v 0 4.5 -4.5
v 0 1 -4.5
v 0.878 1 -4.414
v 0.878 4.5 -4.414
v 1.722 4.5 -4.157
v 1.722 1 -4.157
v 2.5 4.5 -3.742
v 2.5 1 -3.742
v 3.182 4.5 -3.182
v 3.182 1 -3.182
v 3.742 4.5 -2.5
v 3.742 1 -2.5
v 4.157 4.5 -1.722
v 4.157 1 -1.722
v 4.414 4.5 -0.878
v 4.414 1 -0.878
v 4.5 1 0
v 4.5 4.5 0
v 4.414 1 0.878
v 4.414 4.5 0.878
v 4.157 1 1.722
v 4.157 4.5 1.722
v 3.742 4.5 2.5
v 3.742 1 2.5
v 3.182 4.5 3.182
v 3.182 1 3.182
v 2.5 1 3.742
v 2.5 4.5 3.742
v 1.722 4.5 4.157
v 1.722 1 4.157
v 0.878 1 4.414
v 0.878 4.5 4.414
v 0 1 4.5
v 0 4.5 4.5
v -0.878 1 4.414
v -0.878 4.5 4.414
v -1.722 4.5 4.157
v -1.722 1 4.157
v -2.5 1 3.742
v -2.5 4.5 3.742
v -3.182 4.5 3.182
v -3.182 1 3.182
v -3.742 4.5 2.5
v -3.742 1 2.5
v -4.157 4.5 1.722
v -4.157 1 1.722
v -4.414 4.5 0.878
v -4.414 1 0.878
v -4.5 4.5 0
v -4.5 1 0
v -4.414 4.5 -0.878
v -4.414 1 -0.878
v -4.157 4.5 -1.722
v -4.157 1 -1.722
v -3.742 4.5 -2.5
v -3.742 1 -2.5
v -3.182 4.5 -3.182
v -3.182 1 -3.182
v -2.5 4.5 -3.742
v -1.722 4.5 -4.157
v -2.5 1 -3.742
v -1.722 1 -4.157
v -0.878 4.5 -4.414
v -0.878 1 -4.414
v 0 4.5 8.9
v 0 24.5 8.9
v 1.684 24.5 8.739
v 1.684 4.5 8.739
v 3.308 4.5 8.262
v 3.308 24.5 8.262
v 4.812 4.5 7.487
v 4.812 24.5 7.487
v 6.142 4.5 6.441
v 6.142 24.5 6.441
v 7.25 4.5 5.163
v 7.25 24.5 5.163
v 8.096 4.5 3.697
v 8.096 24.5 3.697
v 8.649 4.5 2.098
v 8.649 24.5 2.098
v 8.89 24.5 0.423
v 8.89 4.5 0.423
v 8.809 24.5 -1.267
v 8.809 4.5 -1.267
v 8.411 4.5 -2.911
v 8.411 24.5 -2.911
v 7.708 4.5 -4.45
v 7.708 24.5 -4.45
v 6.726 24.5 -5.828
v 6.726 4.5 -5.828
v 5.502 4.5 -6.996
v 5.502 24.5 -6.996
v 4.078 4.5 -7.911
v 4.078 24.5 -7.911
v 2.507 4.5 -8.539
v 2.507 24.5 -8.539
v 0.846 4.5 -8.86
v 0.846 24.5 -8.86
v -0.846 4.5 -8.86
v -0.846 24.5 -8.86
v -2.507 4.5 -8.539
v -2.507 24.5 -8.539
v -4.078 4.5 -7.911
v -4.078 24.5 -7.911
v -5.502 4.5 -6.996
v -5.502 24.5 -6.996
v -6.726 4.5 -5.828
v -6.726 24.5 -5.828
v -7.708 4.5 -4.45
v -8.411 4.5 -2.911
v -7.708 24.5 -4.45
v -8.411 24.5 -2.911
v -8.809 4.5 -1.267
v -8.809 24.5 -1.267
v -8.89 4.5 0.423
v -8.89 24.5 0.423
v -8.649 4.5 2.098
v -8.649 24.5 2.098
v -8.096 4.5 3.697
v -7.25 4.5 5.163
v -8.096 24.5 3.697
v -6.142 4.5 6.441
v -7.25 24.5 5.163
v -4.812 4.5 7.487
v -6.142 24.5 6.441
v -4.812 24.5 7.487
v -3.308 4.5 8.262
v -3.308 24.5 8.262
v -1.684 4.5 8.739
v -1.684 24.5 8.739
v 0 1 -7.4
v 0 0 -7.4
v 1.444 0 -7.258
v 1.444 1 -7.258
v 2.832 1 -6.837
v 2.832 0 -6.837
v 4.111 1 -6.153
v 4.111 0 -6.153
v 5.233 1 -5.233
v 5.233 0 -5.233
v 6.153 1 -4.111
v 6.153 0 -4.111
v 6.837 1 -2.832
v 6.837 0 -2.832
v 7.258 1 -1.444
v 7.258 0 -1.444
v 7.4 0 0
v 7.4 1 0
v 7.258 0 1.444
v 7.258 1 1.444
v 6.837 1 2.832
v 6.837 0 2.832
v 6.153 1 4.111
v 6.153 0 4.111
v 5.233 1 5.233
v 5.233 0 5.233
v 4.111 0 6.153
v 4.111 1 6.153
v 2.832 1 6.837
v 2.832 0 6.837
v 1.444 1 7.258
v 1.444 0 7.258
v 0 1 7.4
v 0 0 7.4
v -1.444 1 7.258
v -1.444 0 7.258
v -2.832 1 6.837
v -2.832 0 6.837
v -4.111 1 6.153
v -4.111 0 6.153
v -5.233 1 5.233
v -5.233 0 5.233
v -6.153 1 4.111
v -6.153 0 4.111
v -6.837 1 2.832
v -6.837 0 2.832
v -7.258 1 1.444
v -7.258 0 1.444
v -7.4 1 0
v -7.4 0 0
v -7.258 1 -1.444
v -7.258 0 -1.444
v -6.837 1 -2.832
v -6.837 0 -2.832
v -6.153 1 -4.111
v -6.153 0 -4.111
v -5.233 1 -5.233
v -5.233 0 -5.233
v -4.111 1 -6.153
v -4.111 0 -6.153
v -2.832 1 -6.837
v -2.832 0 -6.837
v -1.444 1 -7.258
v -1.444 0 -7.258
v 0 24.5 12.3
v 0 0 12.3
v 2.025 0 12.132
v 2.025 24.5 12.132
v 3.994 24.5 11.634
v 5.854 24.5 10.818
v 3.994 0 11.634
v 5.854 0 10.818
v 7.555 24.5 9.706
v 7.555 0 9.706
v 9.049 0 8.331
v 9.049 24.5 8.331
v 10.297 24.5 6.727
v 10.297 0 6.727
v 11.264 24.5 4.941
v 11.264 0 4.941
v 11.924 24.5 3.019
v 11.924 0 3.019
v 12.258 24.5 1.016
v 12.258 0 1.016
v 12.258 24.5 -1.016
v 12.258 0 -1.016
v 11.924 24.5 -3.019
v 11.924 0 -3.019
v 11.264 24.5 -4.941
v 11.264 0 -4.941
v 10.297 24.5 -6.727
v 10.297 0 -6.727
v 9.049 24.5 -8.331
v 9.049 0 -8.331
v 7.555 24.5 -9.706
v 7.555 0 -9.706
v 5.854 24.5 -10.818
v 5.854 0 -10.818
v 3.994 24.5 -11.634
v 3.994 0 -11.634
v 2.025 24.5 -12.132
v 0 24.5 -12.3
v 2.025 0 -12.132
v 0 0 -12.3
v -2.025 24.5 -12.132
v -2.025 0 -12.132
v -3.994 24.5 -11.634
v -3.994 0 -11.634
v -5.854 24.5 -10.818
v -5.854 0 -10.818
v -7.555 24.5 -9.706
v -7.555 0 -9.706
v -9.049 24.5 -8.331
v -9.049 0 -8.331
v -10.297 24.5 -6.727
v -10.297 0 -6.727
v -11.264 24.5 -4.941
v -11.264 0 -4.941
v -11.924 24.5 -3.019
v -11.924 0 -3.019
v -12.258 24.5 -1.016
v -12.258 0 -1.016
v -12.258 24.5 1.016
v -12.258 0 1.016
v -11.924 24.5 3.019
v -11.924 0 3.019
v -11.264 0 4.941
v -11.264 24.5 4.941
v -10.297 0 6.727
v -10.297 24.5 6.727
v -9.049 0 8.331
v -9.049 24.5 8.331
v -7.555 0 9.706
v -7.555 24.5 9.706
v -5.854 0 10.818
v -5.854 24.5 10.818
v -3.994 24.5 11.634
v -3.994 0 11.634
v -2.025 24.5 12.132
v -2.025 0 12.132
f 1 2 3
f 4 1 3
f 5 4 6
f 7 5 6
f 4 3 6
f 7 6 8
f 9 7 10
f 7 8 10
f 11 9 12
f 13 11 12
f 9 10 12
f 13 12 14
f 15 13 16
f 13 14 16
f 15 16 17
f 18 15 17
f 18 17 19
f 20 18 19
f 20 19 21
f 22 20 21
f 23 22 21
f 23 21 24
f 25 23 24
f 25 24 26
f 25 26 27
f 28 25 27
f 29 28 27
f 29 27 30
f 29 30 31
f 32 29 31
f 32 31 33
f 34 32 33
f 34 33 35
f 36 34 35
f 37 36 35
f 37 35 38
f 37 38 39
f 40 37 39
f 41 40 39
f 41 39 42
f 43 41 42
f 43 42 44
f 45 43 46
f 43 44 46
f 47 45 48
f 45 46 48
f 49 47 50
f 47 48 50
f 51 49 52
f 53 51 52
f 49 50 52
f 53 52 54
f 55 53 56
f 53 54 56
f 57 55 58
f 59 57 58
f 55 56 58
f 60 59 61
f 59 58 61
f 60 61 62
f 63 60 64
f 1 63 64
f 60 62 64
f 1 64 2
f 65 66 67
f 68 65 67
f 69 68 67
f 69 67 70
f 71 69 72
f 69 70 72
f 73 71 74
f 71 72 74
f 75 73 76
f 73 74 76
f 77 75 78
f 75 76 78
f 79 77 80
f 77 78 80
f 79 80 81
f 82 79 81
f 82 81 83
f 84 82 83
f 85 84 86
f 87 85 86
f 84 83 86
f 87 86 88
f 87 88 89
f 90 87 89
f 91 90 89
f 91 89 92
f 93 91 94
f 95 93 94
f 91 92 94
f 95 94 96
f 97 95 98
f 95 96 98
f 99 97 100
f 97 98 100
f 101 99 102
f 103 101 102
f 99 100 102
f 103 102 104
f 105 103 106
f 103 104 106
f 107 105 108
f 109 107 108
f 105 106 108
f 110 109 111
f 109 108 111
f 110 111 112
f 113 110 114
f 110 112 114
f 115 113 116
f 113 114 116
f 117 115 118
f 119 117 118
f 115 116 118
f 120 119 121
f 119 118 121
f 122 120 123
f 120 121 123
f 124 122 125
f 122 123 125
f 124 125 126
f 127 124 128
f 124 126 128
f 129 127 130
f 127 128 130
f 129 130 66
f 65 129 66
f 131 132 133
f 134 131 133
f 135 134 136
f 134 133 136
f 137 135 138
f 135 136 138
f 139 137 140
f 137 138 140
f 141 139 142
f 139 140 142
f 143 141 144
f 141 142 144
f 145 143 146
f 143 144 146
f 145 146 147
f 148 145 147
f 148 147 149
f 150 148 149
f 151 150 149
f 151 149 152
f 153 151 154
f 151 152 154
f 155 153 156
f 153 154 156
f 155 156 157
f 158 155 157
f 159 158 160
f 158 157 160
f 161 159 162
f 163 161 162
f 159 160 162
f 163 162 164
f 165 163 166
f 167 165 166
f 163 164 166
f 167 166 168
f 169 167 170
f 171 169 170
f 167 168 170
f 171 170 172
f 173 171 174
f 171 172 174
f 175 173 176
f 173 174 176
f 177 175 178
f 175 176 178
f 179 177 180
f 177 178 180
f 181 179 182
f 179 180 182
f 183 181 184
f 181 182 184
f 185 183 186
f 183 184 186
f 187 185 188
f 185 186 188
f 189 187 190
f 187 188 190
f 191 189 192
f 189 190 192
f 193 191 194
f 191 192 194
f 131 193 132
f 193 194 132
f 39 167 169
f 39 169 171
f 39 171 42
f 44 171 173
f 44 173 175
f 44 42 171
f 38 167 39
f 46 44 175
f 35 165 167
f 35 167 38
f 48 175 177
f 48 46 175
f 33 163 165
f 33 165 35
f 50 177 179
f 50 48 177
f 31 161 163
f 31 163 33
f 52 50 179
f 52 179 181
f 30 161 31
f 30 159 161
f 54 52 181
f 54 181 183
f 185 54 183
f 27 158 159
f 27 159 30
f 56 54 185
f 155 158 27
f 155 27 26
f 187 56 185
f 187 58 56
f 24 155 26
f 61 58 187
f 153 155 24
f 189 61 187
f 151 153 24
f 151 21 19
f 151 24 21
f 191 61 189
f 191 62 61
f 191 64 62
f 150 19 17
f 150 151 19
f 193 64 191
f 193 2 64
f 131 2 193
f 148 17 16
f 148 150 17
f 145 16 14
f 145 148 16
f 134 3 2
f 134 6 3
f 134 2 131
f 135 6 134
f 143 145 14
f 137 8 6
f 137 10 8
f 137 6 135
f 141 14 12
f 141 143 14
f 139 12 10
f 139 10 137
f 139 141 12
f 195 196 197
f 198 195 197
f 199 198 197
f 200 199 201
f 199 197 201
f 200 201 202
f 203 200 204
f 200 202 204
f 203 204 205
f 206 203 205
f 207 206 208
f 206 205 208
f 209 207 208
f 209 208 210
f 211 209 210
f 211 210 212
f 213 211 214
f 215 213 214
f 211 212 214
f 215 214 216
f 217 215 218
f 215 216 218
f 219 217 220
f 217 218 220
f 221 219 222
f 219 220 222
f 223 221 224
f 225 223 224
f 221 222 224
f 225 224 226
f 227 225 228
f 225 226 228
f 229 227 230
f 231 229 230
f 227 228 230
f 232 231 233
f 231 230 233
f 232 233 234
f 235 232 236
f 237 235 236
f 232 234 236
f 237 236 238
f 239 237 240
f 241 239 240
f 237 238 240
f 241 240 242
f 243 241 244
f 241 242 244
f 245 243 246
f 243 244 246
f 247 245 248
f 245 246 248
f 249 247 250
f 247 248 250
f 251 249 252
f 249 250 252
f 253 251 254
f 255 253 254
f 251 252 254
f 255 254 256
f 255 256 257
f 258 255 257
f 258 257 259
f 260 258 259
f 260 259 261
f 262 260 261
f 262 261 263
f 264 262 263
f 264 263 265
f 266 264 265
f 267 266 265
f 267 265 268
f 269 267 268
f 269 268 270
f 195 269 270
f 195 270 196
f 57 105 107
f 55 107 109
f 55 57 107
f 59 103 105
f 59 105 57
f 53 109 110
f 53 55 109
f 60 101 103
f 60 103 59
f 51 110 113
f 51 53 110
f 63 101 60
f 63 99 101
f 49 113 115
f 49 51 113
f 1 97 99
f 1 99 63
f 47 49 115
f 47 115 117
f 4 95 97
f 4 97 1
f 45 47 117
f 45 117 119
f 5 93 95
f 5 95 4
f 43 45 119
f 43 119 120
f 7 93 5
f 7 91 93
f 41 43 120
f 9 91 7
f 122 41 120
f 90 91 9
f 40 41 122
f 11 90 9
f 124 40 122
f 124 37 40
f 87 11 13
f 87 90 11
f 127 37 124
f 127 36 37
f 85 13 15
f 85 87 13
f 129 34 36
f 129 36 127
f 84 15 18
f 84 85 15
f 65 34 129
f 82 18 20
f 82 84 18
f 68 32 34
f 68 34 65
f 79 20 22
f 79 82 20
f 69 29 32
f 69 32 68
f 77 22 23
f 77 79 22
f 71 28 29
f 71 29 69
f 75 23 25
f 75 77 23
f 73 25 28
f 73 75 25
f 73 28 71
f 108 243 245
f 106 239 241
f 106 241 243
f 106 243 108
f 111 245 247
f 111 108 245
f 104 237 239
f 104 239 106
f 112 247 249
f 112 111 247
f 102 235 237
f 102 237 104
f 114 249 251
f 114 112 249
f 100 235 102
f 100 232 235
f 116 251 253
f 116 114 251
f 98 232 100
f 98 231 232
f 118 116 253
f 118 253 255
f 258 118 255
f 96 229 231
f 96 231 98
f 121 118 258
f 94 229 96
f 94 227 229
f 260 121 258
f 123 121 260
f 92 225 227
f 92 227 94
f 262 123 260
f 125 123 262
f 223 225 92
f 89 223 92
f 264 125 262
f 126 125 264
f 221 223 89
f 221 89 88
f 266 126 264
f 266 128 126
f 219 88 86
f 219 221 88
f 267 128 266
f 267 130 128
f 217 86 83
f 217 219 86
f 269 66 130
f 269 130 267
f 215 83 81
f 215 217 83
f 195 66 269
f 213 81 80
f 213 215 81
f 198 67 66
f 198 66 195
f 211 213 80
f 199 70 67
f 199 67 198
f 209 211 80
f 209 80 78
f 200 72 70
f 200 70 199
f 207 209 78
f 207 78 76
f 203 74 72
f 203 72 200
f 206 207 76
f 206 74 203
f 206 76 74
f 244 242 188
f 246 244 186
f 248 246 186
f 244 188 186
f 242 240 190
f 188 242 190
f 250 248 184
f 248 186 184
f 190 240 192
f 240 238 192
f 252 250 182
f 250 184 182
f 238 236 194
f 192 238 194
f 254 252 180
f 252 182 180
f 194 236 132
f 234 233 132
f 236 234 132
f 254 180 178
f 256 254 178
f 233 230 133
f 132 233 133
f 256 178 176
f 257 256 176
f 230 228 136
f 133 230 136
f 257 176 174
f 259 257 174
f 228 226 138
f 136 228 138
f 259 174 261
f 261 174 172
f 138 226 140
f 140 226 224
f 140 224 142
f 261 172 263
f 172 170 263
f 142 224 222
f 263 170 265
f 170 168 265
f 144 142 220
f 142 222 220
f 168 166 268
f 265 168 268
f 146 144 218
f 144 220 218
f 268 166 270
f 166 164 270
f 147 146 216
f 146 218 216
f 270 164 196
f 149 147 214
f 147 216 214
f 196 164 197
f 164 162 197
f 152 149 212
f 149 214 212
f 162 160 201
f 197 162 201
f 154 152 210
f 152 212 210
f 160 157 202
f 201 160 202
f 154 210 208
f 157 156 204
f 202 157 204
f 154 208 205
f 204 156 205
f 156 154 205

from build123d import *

# Parameters (mm, degrees)
SKETCH1_R           = 12.3
BOSS_EXTRUDE1_DEPTH = 24.5
SKETCH2_R           = 8.9
CUT_EXTRUDE1_DEPTH  = 20
SKETCH3_R           = 7.4
CUT_EXTRUDE2_DEPTH  = 1
SKETCH4_R           = 4.5
CUT_EXTRUDE3_DEPTH  = 30.237475951


with BuildPart() as part:
    # Sketch1 → Boss-Extrude1 (new body)
    with BuildSketch(Plane(origin=(0, 0, 0), x_dir=(1, 0, 0), z_dir=(0, 1, 0))):
        with Locations(Location((0, 0, 0), (0, 0, 270))):
            Circle(SKETCH1_R)
    extrude(amount=BOSS_EXTRUDE1_DEPTH)

    # Sketch2 → Cut-Extrude1 (cut)
    with BuildSketch(Plane(origin=(0, 24.5, 0), x_dir=(1, 0, 0), z_dir=(0, 1, 0))):
        with Locations(Location((0, 0, 0), (0, 0, 270))):
            Circle(SKETCH2_R)
    extrude(amount=-CUT_EXTRUDE1_DEPTH, mode=Mode.SUBTRACT)

    # Sketch3 → Cut-Extrude2 (cut)
    with BuildSketch(Plane.XZ):
        with Locations(Location((0, 0, 0), (0, 0, 270))):
            Circle(SKETCH3_R)
    extrude(amount=-CUT_EXTRUDE2_DEPTH, mode=Mode.SUBTRACT)

    # Sketch4 → Cut-Extrude3 (cut, through all)
    with BuildSketch(Plane.XZ.offset(-1)):
        with Locations(Location((0, 0, 0), (0, 0, 270))):
            Circle(SKETCH4_R)
    extrude(amount=-CUT_EXTRUDE3_DEPTH, mode=Mode.SUBTRACT)


solid = part.part
